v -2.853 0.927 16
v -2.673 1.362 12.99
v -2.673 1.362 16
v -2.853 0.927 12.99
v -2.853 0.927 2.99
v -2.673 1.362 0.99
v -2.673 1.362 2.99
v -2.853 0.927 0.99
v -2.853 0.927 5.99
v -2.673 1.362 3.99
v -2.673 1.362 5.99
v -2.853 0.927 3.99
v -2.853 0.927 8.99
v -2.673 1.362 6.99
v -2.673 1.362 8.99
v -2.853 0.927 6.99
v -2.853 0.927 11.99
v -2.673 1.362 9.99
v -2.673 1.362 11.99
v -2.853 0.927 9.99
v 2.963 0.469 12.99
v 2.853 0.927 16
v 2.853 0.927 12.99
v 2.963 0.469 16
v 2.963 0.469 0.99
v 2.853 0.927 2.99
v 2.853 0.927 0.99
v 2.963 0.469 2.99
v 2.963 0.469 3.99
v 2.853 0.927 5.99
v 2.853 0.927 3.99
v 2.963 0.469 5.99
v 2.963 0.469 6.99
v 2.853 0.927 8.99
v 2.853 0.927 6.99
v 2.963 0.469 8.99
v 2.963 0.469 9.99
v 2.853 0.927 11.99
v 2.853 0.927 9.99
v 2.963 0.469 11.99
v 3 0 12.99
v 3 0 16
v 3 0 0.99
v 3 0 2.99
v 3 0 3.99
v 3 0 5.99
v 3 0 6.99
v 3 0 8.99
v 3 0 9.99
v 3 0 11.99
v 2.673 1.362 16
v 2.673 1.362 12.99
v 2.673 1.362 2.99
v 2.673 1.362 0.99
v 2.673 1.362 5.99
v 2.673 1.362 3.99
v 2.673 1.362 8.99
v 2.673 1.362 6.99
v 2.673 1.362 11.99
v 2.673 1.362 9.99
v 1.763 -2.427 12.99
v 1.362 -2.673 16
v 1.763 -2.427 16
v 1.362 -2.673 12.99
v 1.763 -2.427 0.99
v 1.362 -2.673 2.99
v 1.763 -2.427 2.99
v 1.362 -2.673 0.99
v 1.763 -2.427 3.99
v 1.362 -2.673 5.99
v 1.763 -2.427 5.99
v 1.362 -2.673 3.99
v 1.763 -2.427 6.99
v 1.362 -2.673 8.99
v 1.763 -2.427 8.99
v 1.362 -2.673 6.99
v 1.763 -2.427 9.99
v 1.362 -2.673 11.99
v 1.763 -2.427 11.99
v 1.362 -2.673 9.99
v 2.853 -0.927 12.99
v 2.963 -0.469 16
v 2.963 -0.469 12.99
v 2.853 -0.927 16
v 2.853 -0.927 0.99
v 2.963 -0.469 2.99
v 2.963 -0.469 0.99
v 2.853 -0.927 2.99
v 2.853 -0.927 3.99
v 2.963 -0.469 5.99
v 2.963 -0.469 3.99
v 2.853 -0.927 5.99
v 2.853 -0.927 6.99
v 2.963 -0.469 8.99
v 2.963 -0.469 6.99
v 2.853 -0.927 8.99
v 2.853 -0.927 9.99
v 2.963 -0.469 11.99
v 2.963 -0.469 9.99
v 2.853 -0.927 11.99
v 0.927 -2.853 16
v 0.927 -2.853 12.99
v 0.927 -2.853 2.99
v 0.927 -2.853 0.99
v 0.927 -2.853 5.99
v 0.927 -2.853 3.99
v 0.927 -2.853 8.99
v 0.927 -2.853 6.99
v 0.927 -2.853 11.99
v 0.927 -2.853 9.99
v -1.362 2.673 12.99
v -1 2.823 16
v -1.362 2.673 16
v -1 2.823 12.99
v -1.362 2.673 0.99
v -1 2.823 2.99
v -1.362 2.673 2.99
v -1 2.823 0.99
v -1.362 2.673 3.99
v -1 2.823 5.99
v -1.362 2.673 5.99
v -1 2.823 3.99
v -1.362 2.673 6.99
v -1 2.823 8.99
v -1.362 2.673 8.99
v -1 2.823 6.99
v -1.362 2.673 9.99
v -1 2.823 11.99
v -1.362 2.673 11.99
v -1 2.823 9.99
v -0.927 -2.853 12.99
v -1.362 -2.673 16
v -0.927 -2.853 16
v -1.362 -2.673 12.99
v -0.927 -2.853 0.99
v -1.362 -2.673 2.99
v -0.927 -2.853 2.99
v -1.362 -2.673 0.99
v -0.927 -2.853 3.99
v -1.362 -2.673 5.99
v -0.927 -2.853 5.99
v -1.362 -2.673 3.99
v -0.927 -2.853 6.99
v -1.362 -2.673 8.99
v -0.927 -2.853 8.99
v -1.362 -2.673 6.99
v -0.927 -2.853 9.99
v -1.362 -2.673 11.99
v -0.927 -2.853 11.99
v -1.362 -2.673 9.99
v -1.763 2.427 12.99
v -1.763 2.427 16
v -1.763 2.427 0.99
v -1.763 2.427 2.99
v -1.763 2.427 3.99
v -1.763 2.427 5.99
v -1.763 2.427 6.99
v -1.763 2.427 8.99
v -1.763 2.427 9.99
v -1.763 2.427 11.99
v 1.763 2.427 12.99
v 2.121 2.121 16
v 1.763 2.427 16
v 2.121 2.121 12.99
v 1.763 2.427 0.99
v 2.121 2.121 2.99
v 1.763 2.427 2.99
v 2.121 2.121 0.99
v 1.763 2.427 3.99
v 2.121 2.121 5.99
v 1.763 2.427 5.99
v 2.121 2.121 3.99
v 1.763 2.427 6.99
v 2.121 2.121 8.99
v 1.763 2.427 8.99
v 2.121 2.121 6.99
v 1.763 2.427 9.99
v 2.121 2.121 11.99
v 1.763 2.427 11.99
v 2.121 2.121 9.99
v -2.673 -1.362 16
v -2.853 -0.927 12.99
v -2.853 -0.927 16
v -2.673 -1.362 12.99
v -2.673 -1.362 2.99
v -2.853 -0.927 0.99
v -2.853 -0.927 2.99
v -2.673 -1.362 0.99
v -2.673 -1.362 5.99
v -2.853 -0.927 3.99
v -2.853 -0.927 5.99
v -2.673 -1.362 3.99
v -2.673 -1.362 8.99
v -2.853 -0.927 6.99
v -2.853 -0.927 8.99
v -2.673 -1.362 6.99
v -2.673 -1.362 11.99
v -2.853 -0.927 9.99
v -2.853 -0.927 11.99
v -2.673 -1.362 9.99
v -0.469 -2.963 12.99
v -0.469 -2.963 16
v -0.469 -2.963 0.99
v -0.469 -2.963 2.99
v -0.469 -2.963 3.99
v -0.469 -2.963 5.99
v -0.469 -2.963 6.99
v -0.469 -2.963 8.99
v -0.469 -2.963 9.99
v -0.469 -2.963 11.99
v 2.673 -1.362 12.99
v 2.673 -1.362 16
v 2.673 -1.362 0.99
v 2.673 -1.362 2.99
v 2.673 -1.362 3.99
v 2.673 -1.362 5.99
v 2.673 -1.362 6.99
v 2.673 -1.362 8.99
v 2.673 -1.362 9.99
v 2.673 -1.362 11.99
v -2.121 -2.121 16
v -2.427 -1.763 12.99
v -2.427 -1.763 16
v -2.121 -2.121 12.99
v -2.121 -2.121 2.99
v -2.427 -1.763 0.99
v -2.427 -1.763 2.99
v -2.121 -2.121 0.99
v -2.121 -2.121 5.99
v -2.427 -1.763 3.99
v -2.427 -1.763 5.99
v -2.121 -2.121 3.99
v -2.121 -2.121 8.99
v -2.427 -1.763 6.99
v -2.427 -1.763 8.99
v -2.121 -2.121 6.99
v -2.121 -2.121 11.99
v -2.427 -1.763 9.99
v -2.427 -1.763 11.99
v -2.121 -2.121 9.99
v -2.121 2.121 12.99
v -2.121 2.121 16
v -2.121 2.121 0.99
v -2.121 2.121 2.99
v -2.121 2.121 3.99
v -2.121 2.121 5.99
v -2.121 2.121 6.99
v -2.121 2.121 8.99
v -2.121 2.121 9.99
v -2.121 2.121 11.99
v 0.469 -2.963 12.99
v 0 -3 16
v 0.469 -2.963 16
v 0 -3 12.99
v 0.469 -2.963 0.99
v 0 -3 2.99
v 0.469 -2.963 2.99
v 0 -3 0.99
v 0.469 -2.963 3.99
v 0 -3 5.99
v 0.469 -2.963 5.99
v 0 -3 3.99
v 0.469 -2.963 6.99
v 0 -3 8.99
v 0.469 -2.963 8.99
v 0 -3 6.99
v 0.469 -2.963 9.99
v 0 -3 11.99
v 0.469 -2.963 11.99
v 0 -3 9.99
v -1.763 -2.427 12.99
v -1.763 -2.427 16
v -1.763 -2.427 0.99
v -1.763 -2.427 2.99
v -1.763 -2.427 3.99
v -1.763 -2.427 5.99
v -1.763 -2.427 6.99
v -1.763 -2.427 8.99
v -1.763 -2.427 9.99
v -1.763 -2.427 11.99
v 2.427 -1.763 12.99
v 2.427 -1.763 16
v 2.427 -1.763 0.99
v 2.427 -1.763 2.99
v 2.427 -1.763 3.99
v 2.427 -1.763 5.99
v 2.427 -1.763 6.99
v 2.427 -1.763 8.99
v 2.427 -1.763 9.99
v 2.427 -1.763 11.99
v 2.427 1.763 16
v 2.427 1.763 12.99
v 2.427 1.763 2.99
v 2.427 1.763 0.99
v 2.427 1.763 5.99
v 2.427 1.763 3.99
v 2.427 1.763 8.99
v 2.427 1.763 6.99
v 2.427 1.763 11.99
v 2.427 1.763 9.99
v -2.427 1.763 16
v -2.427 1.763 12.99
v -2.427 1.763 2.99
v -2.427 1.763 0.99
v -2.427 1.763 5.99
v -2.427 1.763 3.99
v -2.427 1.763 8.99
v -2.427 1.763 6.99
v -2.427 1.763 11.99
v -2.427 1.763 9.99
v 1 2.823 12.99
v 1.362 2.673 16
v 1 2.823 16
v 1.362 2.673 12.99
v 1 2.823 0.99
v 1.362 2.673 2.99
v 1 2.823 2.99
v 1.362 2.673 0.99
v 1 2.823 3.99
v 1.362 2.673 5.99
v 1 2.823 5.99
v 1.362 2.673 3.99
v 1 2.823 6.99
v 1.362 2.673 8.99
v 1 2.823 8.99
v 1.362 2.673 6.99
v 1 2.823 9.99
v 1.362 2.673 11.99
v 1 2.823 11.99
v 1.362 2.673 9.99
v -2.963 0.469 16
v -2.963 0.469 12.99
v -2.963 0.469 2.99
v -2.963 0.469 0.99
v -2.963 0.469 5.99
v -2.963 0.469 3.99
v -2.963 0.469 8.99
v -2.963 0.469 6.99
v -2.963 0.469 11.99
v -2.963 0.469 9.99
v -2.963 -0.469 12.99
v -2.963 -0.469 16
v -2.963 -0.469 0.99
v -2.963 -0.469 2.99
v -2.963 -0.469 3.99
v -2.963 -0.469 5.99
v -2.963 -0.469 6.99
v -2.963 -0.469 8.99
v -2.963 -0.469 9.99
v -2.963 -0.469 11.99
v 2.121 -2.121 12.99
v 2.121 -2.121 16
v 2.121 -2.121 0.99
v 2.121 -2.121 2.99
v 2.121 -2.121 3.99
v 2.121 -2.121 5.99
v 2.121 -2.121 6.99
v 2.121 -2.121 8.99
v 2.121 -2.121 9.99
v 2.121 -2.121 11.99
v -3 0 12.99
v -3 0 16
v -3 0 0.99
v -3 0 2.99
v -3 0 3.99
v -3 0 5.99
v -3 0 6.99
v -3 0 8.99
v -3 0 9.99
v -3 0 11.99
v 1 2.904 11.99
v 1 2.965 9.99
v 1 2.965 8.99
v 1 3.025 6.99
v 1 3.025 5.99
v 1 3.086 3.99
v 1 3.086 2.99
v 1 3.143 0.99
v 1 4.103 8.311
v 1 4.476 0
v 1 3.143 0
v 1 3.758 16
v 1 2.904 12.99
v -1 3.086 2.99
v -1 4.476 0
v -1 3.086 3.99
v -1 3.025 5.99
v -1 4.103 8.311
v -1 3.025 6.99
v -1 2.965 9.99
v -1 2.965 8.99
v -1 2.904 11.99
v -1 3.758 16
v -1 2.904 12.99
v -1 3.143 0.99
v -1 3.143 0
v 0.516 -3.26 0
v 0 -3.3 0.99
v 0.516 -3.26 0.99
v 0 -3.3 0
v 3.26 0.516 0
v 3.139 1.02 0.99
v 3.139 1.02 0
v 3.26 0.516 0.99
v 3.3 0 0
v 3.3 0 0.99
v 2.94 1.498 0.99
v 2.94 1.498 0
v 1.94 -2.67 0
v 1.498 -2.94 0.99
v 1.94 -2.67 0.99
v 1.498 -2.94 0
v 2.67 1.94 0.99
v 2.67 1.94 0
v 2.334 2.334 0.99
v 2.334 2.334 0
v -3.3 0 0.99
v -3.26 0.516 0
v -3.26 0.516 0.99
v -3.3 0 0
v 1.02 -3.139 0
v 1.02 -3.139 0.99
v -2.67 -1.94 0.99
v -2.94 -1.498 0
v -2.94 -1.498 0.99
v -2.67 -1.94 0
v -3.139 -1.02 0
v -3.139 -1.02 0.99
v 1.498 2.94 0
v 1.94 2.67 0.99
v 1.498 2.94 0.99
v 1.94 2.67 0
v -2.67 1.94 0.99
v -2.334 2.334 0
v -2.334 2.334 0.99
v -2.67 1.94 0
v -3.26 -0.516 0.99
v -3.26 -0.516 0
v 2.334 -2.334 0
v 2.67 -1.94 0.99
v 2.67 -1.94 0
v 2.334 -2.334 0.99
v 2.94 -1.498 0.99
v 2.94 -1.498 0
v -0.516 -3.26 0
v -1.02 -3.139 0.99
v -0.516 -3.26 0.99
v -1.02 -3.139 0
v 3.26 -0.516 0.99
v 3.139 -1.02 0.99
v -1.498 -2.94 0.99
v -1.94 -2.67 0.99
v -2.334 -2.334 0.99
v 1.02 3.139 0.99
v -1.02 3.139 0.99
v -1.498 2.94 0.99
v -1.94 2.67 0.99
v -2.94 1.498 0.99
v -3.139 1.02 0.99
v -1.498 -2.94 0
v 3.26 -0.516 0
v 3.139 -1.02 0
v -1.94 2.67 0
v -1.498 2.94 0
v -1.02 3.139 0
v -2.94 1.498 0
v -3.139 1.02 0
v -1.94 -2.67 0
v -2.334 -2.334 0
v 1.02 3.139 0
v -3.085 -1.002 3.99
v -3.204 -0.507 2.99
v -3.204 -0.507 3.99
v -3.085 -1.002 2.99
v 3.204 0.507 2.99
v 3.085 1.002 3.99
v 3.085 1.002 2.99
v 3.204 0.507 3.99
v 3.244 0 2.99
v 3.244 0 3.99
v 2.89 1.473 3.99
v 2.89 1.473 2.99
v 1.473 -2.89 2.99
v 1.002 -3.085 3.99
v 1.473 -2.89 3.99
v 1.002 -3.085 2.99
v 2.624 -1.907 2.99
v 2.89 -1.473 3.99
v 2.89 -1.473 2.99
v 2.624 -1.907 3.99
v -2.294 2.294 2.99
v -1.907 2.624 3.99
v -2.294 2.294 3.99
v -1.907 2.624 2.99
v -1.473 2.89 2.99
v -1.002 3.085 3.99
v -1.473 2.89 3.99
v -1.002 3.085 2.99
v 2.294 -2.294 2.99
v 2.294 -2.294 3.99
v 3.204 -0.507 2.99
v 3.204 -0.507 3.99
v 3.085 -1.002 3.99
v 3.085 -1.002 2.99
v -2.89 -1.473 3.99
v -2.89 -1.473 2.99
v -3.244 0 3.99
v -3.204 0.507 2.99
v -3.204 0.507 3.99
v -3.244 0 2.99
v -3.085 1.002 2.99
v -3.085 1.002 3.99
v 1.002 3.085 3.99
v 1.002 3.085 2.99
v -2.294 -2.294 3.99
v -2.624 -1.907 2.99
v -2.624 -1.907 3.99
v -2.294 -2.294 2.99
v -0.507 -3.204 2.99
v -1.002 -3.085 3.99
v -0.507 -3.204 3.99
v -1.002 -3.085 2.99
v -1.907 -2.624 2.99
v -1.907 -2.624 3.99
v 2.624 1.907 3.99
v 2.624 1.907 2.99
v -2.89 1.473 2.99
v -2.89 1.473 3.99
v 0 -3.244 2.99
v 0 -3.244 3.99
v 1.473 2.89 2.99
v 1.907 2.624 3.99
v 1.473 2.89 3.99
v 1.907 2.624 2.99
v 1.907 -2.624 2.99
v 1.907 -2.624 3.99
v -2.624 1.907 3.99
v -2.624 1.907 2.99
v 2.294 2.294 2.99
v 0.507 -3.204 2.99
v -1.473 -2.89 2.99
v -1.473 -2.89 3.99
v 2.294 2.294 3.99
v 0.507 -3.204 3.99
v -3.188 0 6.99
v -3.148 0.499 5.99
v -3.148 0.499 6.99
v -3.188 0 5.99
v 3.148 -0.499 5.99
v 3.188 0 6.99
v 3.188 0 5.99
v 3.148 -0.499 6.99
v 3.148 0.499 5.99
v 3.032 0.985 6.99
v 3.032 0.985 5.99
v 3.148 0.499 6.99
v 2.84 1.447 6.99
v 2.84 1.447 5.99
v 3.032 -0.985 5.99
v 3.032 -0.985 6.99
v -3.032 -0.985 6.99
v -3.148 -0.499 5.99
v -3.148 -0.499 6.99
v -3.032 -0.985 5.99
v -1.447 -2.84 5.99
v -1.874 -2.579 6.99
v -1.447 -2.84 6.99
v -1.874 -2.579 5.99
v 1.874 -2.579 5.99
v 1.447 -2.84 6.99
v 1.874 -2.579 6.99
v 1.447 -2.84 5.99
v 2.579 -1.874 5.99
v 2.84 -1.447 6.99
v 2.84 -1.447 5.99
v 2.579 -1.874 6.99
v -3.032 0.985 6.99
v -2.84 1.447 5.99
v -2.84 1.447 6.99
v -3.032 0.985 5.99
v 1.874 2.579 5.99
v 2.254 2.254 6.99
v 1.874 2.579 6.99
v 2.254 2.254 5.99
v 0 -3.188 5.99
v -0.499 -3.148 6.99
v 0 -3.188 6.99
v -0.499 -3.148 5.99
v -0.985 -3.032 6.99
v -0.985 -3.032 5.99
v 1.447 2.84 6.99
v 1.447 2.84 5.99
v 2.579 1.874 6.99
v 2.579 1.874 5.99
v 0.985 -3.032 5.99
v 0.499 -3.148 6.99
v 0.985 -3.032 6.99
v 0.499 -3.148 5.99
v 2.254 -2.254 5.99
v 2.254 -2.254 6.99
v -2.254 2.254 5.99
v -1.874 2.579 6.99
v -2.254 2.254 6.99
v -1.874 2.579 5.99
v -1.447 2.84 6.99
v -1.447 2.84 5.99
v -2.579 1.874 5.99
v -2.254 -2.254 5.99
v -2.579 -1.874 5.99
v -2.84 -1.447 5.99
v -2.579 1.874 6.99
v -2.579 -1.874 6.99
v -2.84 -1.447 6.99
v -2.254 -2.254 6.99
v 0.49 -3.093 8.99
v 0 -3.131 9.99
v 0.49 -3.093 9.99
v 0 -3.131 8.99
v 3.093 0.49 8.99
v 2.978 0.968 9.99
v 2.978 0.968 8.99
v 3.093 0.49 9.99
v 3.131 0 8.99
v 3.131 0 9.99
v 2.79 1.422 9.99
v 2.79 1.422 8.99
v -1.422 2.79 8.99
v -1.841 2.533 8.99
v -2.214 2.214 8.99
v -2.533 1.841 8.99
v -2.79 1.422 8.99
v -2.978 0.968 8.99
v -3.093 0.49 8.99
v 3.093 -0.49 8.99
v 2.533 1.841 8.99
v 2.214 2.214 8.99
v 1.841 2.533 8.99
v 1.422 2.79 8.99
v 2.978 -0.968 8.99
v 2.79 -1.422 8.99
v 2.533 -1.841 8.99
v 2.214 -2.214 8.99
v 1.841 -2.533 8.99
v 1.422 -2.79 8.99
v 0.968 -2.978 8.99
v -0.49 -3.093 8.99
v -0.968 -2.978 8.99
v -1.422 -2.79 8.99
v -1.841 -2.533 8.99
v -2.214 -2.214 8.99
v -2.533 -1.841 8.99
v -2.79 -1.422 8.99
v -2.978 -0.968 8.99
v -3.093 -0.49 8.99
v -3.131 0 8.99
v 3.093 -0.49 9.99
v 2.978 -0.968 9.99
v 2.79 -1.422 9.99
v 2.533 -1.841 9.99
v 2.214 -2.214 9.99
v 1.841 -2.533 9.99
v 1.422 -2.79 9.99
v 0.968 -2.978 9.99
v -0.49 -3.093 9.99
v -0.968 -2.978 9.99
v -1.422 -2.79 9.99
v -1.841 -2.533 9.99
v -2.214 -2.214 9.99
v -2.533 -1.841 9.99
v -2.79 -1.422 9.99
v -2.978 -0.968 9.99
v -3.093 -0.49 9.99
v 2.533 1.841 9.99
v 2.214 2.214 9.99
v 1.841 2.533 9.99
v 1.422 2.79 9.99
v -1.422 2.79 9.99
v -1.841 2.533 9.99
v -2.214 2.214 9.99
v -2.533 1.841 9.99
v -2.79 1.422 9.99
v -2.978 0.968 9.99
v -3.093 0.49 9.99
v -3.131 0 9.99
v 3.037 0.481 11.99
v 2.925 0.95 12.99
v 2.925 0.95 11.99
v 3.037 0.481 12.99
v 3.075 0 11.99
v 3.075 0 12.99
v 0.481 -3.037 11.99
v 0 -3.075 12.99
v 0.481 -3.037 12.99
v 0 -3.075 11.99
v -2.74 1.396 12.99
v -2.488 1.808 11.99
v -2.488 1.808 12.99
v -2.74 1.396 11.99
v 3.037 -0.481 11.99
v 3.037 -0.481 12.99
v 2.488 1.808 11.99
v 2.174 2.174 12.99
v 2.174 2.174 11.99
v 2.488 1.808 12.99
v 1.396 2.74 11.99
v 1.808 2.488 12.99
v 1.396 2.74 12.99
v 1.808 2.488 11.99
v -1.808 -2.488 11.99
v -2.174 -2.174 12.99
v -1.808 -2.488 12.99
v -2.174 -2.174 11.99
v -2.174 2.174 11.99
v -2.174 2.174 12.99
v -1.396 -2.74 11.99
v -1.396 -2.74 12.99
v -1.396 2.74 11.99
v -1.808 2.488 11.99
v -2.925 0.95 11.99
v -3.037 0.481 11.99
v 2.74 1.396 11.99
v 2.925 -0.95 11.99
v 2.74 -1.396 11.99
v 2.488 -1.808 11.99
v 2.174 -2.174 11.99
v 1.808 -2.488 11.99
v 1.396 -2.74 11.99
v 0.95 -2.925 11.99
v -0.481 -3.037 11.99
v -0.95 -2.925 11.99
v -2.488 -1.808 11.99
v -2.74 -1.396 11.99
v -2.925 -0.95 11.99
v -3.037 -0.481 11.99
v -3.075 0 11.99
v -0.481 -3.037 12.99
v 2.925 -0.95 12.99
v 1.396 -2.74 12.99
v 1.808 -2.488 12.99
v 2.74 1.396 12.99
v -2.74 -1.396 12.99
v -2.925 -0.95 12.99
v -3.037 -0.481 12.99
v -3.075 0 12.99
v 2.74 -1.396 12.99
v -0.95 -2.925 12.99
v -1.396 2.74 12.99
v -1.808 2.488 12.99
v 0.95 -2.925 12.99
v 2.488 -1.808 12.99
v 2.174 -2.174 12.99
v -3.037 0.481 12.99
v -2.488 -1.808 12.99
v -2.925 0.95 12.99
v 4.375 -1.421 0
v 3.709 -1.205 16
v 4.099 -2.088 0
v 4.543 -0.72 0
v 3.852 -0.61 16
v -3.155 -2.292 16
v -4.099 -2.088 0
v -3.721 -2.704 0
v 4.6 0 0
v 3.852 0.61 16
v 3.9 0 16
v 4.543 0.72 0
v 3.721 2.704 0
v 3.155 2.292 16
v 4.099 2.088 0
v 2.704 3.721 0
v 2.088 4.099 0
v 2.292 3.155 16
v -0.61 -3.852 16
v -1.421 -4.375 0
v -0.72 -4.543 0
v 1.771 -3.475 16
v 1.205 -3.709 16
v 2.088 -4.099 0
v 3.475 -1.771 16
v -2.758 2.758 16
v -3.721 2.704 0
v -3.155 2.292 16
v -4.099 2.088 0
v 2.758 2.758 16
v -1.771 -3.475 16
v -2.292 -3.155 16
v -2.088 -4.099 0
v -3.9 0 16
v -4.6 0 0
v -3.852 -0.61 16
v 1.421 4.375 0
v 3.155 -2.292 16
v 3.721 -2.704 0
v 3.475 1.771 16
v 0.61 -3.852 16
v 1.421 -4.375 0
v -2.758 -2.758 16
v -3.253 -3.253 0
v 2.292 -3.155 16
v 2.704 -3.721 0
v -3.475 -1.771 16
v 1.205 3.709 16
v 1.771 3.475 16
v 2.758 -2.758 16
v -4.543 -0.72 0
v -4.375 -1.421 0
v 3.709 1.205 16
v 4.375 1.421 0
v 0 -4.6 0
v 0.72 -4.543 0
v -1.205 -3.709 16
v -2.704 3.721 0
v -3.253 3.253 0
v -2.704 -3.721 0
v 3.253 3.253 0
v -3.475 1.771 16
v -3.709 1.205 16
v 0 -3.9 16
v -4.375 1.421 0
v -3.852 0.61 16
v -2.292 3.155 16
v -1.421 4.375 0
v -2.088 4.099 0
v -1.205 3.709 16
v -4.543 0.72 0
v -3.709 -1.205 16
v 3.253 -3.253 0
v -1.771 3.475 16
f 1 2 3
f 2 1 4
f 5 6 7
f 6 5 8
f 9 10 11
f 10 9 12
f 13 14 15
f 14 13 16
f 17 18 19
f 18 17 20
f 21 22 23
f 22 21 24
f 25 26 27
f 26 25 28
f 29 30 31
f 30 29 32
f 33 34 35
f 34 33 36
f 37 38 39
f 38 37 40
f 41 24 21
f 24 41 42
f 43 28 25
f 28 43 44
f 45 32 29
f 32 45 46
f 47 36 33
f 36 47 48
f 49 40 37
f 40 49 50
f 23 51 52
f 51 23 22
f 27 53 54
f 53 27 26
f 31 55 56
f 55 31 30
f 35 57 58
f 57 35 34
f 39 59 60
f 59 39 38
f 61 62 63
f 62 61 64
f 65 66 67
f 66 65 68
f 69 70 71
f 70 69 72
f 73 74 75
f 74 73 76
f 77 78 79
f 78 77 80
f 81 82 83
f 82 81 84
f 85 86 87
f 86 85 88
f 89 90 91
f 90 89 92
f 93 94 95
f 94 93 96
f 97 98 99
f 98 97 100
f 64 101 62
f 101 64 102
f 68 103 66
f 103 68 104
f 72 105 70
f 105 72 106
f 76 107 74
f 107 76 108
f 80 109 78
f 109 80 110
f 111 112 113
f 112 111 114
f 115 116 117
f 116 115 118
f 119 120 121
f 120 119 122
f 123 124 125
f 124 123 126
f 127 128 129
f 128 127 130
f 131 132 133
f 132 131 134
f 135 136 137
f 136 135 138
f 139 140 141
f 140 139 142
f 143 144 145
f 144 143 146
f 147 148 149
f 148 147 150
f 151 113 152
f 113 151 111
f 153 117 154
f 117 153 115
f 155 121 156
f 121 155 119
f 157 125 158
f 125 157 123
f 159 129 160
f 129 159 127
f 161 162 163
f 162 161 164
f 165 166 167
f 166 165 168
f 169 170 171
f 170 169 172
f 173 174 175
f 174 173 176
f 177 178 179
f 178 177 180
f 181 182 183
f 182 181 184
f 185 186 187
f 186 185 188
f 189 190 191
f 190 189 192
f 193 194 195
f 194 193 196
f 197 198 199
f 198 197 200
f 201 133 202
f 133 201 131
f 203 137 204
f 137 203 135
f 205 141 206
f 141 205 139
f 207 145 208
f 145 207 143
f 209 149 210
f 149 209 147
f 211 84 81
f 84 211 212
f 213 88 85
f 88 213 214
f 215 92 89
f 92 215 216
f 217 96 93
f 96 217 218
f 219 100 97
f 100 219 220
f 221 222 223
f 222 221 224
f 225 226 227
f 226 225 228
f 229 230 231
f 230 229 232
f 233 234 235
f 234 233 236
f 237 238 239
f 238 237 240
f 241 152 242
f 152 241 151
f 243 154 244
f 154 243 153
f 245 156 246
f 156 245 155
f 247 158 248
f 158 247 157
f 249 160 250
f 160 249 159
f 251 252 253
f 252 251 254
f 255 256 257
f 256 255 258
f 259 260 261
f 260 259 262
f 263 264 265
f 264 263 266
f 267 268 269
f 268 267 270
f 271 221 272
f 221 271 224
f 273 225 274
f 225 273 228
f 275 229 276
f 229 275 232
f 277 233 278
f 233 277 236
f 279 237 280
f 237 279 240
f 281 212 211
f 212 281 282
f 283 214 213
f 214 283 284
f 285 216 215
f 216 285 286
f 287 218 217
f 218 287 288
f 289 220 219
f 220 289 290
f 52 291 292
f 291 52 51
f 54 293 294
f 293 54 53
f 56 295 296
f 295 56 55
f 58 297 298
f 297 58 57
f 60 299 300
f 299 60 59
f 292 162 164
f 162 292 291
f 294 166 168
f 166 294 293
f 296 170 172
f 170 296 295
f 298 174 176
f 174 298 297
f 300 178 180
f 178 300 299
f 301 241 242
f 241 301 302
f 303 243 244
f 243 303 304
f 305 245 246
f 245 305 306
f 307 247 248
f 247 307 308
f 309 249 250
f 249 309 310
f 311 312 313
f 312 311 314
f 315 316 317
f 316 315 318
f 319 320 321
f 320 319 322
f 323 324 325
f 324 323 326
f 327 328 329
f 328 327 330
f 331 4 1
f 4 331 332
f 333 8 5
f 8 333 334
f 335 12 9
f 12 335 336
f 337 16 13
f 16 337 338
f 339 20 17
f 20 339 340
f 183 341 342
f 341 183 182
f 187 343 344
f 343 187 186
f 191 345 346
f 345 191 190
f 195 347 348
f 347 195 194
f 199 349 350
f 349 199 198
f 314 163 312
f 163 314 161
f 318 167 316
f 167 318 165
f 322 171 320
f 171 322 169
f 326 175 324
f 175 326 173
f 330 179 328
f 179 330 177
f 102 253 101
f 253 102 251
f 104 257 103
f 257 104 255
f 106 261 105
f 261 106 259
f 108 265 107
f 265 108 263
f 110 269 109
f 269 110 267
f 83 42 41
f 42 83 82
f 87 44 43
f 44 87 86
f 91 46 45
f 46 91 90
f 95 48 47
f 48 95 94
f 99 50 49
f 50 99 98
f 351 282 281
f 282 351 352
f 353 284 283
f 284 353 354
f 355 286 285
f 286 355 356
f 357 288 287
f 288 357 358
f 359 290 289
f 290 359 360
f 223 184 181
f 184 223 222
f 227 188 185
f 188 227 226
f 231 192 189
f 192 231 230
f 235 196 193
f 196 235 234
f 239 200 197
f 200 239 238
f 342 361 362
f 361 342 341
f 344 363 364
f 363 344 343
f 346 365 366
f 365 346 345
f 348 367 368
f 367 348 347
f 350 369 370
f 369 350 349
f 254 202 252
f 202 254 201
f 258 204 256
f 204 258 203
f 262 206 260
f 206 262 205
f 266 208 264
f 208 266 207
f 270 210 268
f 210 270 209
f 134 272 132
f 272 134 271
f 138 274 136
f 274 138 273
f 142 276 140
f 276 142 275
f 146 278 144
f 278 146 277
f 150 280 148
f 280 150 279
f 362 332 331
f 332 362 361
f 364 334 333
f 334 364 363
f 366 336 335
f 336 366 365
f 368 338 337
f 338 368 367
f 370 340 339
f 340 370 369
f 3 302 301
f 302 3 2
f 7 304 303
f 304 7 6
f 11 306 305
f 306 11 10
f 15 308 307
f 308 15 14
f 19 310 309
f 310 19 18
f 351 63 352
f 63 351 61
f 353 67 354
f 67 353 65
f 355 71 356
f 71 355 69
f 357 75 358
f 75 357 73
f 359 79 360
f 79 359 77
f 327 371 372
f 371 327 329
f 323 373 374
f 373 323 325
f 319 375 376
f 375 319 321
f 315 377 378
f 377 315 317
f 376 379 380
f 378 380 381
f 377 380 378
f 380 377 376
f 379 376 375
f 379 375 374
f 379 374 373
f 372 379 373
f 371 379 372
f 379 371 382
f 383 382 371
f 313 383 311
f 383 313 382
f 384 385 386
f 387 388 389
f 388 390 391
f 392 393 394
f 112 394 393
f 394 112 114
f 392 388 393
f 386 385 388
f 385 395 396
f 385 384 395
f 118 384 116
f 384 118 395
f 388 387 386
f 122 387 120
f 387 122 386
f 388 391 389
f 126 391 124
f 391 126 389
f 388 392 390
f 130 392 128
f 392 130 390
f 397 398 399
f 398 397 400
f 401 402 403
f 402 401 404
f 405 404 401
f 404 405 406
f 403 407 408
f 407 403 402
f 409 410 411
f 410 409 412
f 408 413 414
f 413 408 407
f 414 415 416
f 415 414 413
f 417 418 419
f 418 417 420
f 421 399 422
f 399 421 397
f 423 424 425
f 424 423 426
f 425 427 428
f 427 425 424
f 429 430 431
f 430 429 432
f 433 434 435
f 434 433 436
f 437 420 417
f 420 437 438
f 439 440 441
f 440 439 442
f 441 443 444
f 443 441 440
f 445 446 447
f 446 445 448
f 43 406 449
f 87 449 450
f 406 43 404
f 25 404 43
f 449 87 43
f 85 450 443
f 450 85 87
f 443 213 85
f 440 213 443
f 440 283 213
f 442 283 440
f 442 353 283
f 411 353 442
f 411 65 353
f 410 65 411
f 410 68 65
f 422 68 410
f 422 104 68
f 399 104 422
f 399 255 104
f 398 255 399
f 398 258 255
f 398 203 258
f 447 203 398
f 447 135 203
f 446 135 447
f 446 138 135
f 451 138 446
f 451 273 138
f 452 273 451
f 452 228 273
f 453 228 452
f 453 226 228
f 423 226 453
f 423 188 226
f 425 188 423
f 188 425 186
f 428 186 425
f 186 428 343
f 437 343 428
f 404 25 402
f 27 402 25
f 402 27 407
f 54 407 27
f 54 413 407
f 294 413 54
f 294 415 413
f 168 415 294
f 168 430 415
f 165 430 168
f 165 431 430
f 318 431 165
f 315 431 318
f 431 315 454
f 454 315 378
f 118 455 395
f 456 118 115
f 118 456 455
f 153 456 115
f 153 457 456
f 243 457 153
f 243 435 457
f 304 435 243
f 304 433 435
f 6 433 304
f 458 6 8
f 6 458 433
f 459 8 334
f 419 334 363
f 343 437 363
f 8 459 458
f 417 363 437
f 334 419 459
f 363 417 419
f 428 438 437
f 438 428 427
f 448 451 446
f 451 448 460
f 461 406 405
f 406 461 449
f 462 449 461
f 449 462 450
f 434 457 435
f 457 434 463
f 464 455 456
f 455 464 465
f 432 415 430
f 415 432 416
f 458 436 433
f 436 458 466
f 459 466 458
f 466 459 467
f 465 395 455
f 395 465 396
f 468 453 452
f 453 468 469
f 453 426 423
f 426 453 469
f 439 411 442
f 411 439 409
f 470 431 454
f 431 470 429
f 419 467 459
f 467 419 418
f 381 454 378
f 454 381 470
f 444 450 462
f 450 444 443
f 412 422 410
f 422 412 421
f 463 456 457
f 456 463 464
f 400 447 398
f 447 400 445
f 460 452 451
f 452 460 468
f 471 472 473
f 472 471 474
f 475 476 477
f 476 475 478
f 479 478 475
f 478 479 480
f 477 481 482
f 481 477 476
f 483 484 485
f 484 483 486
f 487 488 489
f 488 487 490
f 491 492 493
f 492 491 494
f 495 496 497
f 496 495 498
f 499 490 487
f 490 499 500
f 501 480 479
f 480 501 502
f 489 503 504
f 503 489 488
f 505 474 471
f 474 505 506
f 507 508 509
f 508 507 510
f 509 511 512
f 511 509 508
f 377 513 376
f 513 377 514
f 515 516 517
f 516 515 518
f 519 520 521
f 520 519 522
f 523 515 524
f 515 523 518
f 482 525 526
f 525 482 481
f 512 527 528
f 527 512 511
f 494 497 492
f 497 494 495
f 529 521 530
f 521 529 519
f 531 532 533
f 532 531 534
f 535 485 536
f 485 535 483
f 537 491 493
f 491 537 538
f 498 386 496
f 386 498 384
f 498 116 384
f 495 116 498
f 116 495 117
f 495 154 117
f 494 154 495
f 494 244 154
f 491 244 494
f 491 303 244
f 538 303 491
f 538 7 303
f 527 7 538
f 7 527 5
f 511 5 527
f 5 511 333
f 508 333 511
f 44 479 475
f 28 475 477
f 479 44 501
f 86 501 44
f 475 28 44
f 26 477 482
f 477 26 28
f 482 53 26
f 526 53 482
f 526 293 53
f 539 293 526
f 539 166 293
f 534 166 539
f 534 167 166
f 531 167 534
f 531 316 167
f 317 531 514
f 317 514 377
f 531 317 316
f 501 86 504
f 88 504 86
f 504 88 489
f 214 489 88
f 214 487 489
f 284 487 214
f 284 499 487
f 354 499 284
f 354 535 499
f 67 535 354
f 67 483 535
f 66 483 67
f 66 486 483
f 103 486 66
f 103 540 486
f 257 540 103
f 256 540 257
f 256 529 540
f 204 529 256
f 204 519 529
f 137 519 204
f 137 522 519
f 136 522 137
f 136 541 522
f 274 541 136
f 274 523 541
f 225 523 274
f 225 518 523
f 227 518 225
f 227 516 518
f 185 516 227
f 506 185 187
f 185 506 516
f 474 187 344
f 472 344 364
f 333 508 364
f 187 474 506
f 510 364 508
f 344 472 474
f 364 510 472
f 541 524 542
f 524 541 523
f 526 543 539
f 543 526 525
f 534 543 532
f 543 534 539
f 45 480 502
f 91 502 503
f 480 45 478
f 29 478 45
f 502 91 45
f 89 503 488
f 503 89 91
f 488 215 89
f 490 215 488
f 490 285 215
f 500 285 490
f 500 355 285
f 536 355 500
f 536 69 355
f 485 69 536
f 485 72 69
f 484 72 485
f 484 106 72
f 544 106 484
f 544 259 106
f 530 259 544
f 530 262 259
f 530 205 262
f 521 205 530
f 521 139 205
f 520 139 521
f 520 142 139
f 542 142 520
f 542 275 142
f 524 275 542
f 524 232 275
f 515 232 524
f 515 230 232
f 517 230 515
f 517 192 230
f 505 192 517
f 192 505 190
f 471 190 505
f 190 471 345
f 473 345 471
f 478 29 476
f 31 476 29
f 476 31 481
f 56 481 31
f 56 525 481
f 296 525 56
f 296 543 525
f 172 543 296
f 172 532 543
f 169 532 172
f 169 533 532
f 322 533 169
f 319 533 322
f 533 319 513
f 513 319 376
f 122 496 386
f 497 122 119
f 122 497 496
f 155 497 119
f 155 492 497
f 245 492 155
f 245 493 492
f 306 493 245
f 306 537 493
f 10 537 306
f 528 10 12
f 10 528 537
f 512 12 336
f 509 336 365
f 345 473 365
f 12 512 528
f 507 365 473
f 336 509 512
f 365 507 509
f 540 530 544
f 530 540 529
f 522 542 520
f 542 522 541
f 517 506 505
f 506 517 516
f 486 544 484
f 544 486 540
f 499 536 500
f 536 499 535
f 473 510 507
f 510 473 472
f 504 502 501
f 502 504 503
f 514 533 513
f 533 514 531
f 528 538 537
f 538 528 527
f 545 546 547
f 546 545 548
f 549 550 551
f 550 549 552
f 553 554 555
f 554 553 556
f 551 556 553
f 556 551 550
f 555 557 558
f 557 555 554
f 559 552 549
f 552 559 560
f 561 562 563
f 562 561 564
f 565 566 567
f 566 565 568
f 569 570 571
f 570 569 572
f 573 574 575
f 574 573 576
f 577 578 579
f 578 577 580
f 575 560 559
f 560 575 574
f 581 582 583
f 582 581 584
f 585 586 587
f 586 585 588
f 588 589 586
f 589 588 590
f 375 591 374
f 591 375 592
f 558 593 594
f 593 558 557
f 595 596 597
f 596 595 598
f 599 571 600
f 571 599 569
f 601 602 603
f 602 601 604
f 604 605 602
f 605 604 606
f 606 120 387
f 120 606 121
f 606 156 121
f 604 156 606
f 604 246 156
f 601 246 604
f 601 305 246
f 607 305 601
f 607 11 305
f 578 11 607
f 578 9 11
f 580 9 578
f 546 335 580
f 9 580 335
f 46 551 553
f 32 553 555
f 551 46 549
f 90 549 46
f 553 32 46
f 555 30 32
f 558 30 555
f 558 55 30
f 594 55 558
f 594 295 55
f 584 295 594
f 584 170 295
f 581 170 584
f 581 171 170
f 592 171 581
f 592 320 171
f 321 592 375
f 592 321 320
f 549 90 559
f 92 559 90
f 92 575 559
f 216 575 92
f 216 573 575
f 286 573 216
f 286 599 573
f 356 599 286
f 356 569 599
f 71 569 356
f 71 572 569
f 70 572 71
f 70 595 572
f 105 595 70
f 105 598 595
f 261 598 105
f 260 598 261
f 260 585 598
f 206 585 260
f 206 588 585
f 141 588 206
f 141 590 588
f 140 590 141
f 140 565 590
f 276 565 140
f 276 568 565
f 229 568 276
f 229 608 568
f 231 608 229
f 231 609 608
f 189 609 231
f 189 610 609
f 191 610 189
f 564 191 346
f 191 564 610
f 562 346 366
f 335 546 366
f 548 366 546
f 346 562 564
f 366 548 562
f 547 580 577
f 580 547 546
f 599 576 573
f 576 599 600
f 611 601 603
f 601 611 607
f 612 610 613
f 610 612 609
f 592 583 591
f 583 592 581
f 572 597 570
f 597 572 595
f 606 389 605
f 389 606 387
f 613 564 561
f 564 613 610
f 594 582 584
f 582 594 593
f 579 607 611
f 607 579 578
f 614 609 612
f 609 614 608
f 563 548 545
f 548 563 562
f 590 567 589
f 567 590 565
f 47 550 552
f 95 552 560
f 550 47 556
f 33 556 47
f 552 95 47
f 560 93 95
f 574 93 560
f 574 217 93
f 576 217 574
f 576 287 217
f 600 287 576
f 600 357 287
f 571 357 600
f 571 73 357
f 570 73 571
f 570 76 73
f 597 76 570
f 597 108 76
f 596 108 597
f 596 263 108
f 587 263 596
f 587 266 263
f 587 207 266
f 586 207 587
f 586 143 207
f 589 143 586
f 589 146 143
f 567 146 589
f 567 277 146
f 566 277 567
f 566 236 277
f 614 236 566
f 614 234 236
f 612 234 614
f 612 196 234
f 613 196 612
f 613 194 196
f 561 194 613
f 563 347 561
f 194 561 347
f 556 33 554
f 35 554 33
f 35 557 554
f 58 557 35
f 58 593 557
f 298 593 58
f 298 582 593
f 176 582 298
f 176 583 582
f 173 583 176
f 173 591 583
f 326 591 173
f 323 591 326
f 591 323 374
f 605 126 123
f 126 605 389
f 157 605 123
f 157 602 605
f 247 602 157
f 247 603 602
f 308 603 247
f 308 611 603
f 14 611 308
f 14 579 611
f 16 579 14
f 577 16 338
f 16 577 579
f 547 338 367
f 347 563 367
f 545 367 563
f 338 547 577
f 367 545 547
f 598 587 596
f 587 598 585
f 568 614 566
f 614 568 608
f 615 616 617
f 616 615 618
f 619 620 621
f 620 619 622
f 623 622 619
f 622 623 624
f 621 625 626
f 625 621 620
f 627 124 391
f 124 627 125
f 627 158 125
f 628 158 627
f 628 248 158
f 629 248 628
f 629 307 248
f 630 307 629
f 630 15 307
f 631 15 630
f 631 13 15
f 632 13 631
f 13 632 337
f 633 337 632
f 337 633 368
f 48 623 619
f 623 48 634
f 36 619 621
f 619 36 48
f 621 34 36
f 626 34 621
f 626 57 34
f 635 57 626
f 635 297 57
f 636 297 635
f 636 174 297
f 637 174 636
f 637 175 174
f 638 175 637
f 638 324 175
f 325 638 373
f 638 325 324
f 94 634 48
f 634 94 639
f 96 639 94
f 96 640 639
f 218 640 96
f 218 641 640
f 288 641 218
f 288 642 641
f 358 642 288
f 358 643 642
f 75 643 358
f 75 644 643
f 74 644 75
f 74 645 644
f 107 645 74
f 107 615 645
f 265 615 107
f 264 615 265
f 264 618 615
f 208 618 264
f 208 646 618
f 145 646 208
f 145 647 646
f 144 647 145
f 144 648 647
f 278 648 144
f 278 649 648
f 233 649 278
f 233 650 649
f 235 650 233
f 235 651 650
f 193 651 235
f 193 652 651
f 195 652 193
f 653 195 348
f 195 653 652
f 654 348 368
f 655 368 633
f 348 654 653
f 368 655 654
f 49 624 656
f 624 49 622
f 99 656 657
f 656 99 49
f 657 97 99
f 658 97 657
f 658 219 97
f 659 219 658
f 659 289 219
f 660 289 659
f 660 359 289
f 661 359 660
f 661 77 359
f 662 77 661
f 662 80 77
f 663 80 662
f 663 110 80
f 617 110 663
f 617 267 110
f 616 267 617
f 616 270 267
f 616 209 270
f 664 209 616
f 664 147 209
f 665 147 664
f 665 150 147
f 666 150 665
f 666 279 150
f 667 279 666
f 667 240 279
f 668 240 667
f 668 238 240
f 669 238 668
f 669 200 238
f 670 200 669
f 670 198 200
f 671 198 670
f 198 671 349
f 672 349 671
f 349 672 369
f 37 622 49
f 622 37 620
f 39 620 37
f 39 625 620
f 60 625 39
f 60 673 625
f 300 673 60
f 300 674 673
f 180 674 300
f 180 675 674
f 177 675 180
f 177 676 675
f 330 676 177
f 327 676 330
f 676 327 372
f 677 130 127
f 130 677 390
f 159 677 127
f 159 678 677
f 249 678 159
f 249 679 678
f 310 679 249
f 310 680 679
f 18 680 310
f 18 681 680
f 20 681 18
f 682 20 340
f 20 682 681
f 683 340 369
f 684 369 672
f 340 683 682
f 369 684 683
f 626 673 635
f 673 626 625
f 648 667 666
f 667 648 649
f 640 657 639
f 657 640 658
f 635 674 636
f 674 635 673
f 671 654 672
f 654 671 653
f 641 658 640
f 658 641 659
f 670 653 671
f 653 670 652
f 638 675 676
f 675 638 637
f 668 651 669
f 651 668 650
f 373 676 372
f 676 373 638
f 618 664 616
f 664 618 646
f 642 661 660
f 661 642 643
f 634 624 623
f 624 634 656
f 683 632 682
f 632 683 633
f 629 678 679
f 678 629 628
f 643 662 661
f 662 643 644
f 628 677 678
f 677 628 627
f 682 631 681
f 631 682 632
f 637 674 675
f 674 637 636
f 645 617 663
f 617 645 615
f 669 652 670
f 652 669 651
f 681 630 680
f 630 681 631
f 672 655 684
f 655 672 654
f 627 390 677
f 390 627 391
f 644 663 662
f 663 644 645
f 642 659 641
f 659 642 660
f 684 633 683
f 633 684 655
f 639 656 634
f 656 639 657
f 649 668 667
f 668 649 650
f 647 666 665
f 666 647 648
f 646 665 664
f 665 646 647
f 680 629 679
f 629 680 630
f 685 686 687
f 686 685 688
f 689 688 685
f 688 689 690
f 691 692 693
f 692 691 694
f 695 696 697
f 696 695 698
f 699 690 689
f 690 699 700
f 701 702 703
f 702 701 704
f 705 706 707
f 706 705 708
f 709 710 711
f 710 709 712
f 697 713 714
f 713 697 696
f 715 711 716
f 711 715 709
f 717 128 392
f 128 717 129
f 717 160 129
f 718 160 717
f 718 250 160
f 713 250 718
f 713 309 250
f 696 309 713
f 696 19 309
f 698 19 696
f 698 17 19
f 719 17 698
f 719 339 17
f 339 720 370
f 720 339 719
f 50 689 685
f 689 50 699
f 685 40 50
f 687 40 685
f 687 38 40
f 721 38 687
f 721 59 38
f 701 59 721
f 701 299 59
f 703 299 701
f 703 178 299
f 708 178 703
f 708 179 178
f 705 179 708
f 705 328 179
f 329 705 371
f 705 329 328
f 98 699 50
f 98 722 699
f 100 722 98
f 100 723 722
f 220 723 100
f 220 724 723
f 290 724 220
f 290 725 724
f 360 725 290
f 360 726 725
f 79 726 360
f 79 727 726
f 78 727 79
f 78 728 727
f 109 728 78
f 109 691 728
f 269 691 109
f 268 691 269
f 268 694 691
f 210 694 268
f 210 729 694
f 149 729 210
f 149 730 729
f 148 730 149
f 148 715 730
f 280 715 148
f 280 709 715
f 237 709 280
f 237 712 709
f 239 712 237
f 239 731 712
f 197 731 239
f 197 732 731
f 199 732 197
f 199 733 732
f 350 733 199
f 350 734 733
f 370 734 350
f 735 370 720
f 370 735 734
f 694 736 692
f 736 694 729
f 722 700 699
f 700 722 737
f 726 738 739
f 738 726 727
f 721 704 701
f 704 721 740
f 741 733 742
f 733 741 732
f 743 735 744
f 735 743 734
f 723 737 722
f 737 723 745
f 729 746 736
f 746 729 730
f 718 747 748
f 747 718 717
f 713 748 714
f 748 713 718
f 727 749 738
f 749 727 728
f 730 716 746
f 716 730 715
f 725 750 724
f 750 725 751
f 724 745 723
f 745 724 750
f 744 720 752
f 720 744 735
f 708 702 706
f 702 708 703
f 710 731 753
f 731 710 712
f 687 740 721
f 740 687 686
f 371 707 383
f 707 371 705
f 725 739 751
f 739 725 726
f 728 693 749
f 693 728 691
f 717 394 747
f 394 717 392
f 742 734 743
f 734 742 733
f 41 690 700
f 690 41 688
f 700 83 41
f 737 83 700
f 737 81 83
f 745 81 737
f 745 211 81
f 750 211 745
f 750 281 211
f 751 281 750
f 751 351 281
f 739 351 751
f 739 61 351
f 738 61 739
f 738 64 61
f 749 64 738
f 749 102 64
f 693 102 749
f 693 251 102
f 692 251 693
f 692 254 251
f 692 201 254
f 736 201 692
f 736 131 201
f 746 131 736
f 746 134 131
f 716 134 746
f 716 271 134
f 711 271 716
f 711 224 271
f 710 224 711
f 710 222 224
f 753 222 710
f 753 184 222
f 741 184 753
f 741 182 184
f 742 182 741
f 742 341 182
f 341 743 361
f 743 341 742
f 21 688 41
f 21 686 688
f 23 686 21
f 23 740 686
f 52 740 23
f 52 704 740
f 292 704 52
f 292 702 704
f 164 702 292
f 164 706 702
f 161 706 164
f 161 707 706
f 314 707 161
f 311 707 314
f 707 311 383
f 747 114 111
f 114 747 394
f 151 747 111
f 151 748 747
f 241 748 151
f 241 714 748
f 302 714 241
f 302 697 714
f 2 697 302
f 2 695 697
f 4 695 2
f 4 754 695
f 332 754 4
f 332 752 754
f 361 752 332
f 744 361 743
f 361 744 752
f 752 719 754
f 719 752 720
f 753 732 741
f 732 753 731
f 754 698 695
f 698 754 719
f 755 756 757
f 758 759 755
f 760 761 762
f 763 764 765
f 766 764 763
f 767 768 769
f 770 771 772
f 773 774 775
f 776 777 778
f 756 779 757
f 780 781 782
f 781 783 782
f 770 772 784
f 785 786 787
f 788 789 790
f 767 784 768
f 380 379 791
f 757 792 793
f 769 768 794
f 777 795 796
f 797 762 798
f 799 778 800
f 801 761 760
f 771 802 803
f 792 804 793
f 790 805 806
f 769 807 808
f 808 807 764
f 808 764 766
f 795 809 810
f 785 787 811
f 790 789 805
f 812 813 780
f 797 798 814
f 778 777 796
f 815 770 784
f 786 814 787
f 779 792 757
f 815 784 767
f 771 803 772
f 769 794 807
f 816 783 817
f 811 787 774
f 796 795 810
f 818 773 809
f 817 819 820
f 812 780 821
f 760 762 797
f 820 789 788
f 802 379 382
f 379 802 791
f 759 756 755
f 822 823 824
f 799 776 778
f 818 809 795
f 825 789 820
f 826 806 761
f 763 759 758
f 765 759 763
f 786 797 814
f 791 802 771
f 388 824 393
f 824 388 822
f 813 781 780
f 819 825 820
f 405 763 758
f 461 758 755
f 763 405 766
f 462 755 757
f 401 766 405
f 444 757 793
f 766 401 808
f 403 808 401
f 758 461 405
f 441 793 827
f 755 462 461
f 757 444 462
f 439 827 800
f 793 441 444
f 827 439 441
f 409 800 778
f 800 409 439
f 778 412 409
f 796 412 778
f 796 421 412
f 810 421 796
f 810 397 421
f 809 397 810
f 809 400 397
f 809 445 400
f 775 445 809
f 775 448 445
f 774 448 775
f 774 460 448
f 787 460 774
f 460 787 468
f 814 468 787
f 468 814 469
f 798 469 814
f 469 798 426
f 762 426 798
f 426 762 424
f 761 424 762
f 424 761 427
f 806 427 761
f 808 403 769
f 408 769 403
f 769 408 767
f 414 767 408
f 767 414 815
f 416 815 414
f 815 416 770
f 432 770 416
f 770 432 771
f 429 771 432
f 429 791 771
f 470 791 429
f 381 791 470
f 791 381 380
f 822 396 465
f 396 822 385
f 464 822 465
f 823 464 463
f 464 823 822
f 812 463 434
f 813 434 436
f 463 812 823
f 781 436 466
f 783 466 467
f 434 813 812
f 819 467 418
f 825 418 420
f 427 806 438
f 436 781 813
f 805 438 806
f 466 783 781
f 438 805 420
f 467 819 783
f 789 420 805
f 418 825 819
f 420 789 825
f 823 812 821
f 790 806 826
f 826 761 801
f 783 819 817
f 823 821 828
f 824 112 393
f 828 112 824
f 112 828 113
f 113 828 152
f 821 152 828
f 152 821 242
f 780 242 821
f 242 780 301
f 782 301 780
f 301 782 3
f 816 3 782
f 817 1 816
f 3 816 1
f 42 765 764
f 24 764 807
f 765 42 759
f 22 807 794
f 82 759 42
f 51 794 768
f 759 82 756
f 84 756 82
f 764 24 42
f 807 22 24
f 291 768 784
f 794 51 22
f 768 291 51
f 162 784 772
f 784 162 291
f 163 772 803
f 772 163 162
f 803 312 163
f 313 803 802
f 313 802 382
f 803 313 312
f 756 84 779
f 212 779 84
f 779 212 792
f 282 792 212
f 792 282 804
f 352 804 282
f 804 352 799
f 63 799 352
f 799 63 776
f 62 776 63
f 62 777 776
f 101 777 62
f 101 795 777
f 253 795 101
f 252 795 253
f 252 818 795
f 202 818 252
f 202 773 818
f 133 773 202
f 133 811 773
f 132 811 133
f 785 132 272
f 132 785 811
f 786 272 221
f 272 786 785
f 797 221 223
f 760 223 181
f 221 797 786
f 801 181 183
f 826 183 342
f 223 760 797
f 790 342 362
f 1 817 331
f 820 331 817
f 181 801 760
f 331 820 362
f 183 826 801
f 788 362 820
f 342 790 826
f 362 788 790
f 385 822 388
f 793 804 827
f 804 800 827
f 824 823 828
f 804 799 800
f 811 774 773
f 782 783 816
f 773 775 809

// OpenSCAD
// (main) internal radius (bowden tube diameter)
ir=6;
// (main) cone height
ch=16;
// (main) outside radius (big one)
or1=9.2;
// (main) outside radius (small one)
or2=7.8;
// (optional) width of the vertical opening
gap=2;

// (optional) internal ripple width (at base of cone, will be zero on top)
rippler=0.3;
// (optional) internal ripple height
rippleh=1;
// (optional) internal ripple spacing (will be added to rippleh, ie one 1-mm shoulder with 2mm in between)
ripples=2;

// MoonCactus 2012 06 25 for "Bowden Clamp for Ultimaker (Feeder End)"
// http://www.thingiverse.com/thing:17027
//
// Most interesting values to tune are marked with two stars (**)
//

tol=0+0.01;	// to avoid equalities in shape removal, and let openscad preview work better ;)

$fn=0+40;		// high quality cylinders

difference()
{
	cylinder(r1=or1/2, r2=or2/2, h=ch);
	translate([0,0,-tol])
	{
		cylinder(r=ir/2,h=ch+2*tol);
		translate([-gap/2,0,0]) cube([gap,or1+tol,ch+2*tol]);
	}
	for(i=[-tol:(ripples+rippleh):ch-rippleh-2*tol])
		translate([0,0,i])
			cylinder(r=ir/2+rippler * (ch-i)/ch, h=rippleh);
}
